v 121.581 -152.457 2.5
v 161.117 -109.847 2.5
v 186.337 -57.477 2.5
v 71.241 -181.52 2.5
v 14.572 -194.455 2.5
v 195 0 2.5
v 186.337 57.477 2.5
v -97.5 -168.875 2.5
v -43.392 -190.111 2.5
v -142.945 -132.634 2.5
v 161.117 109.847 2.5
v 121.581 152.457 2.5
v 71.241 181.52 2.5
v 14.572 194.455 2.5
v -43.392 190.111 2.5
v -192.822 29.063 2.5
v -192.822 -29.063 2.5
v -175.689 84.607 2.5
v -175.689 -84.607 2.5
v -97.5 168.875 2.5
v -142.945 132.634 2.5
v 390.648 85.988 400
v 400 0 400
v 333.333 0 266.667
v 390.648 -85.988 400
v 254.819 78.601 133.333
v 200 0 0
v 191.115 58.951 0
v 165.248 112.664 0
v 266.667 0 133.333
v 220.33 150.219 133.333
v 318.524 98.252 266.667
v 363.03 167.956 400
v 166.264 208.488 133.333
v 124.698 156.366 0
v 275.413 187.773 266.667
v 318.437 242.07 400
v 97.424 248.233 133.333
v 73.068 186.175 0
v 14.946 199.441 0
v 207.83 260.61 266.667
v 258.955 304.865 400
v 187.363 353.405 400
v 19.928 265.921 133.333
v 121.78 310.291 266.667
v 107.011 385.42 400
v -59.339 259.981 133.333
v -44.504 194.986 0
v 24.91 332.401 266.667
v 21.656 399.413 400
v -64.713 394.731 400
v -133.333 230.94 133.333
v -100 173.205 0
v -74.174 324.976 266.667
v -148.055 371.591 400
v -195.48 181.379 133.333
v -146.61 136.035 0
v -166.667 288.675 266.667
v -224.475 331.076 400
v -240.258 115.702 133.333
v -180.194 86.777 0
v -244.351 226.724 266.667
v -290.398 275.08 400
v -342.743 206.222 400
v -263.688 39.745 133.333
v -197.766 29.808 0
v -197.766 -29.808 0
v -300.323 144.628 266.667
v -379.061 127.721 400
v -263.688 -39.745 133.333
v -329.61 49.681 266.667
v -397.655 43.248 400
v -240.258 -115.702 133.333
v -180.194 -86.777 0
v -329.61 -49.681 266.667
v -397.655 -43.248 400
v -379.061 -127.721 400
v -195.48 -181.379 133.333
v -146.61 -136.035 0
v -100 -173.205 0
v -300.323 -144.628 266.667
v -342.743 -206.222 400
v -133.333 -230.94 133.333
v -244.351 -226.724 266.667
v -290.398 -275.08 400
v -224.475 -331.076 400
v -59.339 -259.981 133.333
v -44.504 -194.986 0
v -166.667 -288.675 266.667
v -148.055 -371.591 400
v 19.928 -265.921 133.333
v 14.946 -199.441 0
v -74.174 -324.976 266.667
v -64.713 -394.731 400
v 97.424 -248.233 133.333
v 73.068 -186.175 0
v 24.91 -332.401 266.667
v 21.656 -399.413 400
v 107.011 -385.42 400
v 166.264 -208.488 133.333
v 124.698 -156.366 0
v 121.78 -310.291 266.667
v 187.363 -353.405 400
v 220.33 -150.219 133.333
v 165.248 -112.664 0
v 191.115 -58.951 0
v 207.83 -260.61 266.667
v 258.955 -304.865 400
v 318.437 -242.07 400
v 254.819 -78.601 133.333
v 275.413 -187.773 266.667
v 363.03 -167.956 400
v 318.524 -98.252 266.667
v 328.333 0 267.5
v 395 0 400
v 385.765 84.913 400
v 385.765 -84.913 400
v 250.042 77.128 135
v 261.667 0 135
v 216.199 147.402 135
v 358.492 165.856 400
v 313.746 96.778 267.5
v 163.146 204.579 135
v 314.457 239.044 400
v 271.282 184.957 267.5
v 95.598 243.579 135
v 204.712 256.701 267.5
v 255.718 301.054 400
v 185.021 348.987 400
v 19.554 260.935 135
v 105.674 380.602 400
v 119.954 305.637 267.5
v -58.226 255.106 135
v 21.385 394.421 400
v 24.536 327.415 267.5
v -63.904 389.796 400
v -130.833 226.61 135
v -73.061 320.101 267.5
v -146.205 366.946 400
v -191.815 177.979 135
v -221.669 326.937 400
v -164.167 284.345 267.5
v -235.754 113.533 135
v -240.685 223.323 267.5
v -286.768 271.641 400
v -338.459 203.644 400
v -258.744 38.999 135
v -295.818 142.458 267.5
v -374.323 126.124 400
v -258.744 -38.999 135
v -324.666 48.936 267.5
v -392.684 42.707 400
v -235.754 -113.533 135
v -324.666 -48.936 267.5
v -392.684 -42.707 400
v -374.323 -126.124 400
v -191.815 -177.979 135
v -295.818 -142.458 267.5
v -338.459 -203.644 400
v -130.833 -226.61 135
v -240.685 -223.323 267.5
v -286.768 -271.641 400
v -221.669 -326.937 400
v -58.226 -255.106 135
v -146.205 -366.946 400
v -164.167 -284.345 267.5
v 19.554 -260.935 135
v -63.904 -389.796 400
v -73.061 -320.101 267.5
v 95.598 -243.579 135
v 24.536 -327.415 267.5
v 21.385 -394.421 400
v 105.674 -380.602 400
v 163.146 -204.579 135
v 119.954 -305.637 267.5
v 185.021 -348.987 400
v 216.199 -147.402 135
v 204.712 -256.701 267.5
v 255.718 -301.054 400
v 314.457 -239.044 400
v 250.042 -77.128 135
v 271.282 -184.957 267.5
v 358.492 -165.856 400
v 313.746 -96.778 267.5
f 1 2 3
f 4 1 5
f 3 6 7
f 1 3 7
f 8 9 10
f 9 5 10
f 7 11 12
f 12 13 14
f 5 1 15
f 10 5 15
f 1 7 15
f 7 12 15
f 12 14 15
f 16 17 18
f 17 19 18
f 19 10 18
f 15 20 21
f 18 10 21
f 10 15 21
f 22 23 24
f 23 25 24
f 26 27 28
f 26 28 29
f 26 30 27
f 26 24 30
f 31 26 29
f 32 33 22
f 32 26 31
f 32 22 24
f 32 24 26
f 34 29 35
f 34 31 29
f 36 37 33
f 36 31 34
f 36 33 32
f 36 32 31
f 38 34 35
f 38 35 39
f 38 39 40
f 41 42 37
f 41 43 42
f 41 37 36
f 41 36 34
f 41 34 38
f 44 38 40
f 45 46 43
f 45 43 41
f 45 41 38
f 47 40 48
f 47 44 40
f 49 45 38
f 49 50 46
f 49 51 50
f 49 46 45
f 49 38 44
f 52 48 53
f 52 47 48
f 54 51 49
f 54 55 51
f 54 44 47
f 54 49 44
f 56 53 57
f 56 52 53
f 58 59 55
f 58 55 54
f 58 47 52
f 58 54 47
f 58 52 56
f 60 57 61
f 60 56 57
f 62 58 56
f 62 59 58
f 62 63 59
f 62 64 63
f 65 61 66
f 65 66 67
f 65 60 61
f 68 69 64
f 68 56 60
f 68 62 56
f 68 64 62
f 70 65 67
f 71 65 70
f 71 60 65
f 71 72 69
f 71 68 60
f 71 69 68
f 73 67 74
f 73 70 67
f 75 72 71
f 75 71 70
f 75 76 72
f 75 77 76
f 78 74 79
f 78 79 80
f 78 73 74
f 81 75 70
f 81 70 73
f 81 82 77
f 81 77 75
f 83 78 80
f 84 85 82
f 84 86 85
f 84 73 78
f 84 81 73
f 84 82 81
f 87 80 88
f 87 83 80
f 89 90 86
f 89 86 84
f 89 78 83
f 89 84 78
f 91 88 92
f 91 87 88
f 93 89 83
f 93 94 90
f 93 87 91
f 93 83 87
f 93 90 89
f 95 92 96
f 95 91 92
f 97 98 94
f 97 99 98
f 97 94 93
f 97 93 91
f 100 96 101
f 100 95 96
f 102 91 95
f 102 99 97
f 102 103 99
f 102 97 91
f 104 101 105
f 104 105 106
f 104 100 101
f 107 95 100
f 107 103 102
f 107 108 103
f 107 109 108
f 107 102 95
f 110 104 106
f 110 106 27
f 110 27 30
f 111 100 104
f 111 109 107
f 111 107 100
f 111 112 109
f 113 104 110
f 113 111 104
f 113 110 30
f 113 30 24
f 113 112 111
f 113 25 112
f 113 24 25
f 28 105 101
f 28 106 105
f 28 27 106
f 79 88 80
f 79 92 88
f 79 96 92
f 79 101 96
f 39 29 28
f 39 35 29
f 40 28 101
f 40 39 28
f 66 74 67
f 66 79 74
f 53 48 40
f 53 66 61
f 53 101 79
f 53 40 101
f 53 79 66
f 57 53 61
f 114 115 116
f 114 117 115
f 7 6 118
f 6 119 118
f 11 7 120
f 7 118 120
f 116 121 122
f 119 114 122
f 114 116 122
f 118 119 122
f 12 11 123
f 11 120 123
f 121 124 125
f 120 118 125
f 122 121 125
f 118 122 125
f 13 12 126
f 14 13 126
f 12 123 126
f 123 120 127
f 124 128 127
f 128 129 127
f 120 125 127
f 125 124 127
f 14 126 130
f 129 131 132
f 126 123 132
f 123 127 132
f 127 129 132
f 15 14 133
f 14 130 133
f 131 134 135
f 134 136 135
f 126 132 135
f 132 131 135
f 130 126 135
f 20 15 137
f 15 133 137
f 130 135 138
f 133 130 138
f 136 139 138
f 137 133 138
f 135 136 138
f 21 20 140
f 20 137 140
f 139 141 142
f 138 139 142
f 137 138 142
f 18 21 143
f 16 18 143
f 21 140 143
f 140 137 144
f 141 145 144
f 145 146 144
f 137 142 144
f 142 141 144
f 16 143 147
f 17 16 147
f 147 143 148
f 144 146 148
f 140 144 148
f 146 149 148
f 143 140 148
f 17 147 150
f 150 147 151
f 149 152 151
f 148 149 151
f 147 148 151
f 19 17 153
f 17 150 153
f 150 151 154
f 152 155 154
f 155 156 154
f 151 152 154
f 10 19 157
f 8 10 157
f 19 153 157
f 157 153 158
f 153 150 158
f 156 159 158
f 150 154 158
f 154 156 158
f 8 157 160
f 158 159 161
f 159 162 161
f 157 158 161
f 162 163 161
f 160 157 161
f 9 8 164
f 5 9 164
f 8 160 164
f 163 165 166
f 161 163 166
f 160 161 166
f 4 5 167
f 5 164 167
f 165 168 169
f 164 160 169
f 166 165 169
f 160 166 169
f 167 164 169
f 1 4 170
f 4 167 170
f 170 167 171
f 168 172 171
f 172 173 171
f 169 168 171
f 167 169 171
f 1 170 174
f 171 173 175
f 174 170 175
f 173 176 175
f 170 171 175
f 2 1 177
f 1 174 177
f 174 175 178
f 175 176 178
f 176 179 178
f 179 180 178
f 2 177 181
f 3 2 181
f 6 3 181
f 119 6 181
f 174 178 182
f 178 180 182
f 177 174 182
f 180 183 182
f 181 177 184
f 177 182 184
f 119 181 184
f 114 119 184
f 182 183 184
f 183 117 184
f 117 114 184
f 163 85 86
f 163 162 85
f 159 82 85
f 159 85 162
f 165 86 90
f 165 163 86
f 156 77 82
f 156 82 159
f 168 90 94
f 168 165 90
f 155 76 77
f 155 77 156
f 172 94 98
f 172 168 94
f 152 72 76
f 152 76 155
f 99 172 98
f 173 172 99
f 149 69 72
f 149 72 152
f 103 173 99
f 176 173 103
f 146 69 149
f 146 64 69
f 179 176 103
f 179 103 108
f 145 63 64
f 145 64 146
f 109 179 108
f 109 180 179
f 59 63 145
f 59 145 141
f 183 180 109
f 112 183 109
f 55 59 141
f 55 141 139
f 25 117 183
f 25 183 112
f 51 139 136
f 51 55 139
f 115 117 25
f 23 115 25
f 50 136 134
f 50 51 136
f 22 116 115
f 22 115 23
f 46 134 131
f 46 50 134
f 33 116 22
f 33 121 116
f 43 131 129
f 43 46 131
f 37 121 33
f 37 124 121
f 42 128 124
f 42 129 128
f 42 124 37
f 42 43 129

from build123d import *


with BuildPart() as cono001:
    # Cone001 → Cone001 (revolve)
    with BuildSketch(Plane(origin=(0, 0, 2.5), x_dir=(1, 0, 0), z_dir=(0, -1, 0))):
        Polygon((0, 0), (195, 0), (395, 397.5), (0, 397.5), align=None)
    revolve(axis=Axis((0, 0, 2.5), (0, 0, 1)))


with BuildPart() as cut:
    # Cone → Cone (revolve)
    with BuildSketch(Plane.XZ):
        Polygon((0, 0), (200, 0), (400, 400), (0, 400), align=None)
    revolve(axis=Axis((0, 0, 0), (0, 0, 1)))

    # Cut: cut Cono001
    add(cono001.part, mode=Mode.SUBTRACT)


solid = cut.part
